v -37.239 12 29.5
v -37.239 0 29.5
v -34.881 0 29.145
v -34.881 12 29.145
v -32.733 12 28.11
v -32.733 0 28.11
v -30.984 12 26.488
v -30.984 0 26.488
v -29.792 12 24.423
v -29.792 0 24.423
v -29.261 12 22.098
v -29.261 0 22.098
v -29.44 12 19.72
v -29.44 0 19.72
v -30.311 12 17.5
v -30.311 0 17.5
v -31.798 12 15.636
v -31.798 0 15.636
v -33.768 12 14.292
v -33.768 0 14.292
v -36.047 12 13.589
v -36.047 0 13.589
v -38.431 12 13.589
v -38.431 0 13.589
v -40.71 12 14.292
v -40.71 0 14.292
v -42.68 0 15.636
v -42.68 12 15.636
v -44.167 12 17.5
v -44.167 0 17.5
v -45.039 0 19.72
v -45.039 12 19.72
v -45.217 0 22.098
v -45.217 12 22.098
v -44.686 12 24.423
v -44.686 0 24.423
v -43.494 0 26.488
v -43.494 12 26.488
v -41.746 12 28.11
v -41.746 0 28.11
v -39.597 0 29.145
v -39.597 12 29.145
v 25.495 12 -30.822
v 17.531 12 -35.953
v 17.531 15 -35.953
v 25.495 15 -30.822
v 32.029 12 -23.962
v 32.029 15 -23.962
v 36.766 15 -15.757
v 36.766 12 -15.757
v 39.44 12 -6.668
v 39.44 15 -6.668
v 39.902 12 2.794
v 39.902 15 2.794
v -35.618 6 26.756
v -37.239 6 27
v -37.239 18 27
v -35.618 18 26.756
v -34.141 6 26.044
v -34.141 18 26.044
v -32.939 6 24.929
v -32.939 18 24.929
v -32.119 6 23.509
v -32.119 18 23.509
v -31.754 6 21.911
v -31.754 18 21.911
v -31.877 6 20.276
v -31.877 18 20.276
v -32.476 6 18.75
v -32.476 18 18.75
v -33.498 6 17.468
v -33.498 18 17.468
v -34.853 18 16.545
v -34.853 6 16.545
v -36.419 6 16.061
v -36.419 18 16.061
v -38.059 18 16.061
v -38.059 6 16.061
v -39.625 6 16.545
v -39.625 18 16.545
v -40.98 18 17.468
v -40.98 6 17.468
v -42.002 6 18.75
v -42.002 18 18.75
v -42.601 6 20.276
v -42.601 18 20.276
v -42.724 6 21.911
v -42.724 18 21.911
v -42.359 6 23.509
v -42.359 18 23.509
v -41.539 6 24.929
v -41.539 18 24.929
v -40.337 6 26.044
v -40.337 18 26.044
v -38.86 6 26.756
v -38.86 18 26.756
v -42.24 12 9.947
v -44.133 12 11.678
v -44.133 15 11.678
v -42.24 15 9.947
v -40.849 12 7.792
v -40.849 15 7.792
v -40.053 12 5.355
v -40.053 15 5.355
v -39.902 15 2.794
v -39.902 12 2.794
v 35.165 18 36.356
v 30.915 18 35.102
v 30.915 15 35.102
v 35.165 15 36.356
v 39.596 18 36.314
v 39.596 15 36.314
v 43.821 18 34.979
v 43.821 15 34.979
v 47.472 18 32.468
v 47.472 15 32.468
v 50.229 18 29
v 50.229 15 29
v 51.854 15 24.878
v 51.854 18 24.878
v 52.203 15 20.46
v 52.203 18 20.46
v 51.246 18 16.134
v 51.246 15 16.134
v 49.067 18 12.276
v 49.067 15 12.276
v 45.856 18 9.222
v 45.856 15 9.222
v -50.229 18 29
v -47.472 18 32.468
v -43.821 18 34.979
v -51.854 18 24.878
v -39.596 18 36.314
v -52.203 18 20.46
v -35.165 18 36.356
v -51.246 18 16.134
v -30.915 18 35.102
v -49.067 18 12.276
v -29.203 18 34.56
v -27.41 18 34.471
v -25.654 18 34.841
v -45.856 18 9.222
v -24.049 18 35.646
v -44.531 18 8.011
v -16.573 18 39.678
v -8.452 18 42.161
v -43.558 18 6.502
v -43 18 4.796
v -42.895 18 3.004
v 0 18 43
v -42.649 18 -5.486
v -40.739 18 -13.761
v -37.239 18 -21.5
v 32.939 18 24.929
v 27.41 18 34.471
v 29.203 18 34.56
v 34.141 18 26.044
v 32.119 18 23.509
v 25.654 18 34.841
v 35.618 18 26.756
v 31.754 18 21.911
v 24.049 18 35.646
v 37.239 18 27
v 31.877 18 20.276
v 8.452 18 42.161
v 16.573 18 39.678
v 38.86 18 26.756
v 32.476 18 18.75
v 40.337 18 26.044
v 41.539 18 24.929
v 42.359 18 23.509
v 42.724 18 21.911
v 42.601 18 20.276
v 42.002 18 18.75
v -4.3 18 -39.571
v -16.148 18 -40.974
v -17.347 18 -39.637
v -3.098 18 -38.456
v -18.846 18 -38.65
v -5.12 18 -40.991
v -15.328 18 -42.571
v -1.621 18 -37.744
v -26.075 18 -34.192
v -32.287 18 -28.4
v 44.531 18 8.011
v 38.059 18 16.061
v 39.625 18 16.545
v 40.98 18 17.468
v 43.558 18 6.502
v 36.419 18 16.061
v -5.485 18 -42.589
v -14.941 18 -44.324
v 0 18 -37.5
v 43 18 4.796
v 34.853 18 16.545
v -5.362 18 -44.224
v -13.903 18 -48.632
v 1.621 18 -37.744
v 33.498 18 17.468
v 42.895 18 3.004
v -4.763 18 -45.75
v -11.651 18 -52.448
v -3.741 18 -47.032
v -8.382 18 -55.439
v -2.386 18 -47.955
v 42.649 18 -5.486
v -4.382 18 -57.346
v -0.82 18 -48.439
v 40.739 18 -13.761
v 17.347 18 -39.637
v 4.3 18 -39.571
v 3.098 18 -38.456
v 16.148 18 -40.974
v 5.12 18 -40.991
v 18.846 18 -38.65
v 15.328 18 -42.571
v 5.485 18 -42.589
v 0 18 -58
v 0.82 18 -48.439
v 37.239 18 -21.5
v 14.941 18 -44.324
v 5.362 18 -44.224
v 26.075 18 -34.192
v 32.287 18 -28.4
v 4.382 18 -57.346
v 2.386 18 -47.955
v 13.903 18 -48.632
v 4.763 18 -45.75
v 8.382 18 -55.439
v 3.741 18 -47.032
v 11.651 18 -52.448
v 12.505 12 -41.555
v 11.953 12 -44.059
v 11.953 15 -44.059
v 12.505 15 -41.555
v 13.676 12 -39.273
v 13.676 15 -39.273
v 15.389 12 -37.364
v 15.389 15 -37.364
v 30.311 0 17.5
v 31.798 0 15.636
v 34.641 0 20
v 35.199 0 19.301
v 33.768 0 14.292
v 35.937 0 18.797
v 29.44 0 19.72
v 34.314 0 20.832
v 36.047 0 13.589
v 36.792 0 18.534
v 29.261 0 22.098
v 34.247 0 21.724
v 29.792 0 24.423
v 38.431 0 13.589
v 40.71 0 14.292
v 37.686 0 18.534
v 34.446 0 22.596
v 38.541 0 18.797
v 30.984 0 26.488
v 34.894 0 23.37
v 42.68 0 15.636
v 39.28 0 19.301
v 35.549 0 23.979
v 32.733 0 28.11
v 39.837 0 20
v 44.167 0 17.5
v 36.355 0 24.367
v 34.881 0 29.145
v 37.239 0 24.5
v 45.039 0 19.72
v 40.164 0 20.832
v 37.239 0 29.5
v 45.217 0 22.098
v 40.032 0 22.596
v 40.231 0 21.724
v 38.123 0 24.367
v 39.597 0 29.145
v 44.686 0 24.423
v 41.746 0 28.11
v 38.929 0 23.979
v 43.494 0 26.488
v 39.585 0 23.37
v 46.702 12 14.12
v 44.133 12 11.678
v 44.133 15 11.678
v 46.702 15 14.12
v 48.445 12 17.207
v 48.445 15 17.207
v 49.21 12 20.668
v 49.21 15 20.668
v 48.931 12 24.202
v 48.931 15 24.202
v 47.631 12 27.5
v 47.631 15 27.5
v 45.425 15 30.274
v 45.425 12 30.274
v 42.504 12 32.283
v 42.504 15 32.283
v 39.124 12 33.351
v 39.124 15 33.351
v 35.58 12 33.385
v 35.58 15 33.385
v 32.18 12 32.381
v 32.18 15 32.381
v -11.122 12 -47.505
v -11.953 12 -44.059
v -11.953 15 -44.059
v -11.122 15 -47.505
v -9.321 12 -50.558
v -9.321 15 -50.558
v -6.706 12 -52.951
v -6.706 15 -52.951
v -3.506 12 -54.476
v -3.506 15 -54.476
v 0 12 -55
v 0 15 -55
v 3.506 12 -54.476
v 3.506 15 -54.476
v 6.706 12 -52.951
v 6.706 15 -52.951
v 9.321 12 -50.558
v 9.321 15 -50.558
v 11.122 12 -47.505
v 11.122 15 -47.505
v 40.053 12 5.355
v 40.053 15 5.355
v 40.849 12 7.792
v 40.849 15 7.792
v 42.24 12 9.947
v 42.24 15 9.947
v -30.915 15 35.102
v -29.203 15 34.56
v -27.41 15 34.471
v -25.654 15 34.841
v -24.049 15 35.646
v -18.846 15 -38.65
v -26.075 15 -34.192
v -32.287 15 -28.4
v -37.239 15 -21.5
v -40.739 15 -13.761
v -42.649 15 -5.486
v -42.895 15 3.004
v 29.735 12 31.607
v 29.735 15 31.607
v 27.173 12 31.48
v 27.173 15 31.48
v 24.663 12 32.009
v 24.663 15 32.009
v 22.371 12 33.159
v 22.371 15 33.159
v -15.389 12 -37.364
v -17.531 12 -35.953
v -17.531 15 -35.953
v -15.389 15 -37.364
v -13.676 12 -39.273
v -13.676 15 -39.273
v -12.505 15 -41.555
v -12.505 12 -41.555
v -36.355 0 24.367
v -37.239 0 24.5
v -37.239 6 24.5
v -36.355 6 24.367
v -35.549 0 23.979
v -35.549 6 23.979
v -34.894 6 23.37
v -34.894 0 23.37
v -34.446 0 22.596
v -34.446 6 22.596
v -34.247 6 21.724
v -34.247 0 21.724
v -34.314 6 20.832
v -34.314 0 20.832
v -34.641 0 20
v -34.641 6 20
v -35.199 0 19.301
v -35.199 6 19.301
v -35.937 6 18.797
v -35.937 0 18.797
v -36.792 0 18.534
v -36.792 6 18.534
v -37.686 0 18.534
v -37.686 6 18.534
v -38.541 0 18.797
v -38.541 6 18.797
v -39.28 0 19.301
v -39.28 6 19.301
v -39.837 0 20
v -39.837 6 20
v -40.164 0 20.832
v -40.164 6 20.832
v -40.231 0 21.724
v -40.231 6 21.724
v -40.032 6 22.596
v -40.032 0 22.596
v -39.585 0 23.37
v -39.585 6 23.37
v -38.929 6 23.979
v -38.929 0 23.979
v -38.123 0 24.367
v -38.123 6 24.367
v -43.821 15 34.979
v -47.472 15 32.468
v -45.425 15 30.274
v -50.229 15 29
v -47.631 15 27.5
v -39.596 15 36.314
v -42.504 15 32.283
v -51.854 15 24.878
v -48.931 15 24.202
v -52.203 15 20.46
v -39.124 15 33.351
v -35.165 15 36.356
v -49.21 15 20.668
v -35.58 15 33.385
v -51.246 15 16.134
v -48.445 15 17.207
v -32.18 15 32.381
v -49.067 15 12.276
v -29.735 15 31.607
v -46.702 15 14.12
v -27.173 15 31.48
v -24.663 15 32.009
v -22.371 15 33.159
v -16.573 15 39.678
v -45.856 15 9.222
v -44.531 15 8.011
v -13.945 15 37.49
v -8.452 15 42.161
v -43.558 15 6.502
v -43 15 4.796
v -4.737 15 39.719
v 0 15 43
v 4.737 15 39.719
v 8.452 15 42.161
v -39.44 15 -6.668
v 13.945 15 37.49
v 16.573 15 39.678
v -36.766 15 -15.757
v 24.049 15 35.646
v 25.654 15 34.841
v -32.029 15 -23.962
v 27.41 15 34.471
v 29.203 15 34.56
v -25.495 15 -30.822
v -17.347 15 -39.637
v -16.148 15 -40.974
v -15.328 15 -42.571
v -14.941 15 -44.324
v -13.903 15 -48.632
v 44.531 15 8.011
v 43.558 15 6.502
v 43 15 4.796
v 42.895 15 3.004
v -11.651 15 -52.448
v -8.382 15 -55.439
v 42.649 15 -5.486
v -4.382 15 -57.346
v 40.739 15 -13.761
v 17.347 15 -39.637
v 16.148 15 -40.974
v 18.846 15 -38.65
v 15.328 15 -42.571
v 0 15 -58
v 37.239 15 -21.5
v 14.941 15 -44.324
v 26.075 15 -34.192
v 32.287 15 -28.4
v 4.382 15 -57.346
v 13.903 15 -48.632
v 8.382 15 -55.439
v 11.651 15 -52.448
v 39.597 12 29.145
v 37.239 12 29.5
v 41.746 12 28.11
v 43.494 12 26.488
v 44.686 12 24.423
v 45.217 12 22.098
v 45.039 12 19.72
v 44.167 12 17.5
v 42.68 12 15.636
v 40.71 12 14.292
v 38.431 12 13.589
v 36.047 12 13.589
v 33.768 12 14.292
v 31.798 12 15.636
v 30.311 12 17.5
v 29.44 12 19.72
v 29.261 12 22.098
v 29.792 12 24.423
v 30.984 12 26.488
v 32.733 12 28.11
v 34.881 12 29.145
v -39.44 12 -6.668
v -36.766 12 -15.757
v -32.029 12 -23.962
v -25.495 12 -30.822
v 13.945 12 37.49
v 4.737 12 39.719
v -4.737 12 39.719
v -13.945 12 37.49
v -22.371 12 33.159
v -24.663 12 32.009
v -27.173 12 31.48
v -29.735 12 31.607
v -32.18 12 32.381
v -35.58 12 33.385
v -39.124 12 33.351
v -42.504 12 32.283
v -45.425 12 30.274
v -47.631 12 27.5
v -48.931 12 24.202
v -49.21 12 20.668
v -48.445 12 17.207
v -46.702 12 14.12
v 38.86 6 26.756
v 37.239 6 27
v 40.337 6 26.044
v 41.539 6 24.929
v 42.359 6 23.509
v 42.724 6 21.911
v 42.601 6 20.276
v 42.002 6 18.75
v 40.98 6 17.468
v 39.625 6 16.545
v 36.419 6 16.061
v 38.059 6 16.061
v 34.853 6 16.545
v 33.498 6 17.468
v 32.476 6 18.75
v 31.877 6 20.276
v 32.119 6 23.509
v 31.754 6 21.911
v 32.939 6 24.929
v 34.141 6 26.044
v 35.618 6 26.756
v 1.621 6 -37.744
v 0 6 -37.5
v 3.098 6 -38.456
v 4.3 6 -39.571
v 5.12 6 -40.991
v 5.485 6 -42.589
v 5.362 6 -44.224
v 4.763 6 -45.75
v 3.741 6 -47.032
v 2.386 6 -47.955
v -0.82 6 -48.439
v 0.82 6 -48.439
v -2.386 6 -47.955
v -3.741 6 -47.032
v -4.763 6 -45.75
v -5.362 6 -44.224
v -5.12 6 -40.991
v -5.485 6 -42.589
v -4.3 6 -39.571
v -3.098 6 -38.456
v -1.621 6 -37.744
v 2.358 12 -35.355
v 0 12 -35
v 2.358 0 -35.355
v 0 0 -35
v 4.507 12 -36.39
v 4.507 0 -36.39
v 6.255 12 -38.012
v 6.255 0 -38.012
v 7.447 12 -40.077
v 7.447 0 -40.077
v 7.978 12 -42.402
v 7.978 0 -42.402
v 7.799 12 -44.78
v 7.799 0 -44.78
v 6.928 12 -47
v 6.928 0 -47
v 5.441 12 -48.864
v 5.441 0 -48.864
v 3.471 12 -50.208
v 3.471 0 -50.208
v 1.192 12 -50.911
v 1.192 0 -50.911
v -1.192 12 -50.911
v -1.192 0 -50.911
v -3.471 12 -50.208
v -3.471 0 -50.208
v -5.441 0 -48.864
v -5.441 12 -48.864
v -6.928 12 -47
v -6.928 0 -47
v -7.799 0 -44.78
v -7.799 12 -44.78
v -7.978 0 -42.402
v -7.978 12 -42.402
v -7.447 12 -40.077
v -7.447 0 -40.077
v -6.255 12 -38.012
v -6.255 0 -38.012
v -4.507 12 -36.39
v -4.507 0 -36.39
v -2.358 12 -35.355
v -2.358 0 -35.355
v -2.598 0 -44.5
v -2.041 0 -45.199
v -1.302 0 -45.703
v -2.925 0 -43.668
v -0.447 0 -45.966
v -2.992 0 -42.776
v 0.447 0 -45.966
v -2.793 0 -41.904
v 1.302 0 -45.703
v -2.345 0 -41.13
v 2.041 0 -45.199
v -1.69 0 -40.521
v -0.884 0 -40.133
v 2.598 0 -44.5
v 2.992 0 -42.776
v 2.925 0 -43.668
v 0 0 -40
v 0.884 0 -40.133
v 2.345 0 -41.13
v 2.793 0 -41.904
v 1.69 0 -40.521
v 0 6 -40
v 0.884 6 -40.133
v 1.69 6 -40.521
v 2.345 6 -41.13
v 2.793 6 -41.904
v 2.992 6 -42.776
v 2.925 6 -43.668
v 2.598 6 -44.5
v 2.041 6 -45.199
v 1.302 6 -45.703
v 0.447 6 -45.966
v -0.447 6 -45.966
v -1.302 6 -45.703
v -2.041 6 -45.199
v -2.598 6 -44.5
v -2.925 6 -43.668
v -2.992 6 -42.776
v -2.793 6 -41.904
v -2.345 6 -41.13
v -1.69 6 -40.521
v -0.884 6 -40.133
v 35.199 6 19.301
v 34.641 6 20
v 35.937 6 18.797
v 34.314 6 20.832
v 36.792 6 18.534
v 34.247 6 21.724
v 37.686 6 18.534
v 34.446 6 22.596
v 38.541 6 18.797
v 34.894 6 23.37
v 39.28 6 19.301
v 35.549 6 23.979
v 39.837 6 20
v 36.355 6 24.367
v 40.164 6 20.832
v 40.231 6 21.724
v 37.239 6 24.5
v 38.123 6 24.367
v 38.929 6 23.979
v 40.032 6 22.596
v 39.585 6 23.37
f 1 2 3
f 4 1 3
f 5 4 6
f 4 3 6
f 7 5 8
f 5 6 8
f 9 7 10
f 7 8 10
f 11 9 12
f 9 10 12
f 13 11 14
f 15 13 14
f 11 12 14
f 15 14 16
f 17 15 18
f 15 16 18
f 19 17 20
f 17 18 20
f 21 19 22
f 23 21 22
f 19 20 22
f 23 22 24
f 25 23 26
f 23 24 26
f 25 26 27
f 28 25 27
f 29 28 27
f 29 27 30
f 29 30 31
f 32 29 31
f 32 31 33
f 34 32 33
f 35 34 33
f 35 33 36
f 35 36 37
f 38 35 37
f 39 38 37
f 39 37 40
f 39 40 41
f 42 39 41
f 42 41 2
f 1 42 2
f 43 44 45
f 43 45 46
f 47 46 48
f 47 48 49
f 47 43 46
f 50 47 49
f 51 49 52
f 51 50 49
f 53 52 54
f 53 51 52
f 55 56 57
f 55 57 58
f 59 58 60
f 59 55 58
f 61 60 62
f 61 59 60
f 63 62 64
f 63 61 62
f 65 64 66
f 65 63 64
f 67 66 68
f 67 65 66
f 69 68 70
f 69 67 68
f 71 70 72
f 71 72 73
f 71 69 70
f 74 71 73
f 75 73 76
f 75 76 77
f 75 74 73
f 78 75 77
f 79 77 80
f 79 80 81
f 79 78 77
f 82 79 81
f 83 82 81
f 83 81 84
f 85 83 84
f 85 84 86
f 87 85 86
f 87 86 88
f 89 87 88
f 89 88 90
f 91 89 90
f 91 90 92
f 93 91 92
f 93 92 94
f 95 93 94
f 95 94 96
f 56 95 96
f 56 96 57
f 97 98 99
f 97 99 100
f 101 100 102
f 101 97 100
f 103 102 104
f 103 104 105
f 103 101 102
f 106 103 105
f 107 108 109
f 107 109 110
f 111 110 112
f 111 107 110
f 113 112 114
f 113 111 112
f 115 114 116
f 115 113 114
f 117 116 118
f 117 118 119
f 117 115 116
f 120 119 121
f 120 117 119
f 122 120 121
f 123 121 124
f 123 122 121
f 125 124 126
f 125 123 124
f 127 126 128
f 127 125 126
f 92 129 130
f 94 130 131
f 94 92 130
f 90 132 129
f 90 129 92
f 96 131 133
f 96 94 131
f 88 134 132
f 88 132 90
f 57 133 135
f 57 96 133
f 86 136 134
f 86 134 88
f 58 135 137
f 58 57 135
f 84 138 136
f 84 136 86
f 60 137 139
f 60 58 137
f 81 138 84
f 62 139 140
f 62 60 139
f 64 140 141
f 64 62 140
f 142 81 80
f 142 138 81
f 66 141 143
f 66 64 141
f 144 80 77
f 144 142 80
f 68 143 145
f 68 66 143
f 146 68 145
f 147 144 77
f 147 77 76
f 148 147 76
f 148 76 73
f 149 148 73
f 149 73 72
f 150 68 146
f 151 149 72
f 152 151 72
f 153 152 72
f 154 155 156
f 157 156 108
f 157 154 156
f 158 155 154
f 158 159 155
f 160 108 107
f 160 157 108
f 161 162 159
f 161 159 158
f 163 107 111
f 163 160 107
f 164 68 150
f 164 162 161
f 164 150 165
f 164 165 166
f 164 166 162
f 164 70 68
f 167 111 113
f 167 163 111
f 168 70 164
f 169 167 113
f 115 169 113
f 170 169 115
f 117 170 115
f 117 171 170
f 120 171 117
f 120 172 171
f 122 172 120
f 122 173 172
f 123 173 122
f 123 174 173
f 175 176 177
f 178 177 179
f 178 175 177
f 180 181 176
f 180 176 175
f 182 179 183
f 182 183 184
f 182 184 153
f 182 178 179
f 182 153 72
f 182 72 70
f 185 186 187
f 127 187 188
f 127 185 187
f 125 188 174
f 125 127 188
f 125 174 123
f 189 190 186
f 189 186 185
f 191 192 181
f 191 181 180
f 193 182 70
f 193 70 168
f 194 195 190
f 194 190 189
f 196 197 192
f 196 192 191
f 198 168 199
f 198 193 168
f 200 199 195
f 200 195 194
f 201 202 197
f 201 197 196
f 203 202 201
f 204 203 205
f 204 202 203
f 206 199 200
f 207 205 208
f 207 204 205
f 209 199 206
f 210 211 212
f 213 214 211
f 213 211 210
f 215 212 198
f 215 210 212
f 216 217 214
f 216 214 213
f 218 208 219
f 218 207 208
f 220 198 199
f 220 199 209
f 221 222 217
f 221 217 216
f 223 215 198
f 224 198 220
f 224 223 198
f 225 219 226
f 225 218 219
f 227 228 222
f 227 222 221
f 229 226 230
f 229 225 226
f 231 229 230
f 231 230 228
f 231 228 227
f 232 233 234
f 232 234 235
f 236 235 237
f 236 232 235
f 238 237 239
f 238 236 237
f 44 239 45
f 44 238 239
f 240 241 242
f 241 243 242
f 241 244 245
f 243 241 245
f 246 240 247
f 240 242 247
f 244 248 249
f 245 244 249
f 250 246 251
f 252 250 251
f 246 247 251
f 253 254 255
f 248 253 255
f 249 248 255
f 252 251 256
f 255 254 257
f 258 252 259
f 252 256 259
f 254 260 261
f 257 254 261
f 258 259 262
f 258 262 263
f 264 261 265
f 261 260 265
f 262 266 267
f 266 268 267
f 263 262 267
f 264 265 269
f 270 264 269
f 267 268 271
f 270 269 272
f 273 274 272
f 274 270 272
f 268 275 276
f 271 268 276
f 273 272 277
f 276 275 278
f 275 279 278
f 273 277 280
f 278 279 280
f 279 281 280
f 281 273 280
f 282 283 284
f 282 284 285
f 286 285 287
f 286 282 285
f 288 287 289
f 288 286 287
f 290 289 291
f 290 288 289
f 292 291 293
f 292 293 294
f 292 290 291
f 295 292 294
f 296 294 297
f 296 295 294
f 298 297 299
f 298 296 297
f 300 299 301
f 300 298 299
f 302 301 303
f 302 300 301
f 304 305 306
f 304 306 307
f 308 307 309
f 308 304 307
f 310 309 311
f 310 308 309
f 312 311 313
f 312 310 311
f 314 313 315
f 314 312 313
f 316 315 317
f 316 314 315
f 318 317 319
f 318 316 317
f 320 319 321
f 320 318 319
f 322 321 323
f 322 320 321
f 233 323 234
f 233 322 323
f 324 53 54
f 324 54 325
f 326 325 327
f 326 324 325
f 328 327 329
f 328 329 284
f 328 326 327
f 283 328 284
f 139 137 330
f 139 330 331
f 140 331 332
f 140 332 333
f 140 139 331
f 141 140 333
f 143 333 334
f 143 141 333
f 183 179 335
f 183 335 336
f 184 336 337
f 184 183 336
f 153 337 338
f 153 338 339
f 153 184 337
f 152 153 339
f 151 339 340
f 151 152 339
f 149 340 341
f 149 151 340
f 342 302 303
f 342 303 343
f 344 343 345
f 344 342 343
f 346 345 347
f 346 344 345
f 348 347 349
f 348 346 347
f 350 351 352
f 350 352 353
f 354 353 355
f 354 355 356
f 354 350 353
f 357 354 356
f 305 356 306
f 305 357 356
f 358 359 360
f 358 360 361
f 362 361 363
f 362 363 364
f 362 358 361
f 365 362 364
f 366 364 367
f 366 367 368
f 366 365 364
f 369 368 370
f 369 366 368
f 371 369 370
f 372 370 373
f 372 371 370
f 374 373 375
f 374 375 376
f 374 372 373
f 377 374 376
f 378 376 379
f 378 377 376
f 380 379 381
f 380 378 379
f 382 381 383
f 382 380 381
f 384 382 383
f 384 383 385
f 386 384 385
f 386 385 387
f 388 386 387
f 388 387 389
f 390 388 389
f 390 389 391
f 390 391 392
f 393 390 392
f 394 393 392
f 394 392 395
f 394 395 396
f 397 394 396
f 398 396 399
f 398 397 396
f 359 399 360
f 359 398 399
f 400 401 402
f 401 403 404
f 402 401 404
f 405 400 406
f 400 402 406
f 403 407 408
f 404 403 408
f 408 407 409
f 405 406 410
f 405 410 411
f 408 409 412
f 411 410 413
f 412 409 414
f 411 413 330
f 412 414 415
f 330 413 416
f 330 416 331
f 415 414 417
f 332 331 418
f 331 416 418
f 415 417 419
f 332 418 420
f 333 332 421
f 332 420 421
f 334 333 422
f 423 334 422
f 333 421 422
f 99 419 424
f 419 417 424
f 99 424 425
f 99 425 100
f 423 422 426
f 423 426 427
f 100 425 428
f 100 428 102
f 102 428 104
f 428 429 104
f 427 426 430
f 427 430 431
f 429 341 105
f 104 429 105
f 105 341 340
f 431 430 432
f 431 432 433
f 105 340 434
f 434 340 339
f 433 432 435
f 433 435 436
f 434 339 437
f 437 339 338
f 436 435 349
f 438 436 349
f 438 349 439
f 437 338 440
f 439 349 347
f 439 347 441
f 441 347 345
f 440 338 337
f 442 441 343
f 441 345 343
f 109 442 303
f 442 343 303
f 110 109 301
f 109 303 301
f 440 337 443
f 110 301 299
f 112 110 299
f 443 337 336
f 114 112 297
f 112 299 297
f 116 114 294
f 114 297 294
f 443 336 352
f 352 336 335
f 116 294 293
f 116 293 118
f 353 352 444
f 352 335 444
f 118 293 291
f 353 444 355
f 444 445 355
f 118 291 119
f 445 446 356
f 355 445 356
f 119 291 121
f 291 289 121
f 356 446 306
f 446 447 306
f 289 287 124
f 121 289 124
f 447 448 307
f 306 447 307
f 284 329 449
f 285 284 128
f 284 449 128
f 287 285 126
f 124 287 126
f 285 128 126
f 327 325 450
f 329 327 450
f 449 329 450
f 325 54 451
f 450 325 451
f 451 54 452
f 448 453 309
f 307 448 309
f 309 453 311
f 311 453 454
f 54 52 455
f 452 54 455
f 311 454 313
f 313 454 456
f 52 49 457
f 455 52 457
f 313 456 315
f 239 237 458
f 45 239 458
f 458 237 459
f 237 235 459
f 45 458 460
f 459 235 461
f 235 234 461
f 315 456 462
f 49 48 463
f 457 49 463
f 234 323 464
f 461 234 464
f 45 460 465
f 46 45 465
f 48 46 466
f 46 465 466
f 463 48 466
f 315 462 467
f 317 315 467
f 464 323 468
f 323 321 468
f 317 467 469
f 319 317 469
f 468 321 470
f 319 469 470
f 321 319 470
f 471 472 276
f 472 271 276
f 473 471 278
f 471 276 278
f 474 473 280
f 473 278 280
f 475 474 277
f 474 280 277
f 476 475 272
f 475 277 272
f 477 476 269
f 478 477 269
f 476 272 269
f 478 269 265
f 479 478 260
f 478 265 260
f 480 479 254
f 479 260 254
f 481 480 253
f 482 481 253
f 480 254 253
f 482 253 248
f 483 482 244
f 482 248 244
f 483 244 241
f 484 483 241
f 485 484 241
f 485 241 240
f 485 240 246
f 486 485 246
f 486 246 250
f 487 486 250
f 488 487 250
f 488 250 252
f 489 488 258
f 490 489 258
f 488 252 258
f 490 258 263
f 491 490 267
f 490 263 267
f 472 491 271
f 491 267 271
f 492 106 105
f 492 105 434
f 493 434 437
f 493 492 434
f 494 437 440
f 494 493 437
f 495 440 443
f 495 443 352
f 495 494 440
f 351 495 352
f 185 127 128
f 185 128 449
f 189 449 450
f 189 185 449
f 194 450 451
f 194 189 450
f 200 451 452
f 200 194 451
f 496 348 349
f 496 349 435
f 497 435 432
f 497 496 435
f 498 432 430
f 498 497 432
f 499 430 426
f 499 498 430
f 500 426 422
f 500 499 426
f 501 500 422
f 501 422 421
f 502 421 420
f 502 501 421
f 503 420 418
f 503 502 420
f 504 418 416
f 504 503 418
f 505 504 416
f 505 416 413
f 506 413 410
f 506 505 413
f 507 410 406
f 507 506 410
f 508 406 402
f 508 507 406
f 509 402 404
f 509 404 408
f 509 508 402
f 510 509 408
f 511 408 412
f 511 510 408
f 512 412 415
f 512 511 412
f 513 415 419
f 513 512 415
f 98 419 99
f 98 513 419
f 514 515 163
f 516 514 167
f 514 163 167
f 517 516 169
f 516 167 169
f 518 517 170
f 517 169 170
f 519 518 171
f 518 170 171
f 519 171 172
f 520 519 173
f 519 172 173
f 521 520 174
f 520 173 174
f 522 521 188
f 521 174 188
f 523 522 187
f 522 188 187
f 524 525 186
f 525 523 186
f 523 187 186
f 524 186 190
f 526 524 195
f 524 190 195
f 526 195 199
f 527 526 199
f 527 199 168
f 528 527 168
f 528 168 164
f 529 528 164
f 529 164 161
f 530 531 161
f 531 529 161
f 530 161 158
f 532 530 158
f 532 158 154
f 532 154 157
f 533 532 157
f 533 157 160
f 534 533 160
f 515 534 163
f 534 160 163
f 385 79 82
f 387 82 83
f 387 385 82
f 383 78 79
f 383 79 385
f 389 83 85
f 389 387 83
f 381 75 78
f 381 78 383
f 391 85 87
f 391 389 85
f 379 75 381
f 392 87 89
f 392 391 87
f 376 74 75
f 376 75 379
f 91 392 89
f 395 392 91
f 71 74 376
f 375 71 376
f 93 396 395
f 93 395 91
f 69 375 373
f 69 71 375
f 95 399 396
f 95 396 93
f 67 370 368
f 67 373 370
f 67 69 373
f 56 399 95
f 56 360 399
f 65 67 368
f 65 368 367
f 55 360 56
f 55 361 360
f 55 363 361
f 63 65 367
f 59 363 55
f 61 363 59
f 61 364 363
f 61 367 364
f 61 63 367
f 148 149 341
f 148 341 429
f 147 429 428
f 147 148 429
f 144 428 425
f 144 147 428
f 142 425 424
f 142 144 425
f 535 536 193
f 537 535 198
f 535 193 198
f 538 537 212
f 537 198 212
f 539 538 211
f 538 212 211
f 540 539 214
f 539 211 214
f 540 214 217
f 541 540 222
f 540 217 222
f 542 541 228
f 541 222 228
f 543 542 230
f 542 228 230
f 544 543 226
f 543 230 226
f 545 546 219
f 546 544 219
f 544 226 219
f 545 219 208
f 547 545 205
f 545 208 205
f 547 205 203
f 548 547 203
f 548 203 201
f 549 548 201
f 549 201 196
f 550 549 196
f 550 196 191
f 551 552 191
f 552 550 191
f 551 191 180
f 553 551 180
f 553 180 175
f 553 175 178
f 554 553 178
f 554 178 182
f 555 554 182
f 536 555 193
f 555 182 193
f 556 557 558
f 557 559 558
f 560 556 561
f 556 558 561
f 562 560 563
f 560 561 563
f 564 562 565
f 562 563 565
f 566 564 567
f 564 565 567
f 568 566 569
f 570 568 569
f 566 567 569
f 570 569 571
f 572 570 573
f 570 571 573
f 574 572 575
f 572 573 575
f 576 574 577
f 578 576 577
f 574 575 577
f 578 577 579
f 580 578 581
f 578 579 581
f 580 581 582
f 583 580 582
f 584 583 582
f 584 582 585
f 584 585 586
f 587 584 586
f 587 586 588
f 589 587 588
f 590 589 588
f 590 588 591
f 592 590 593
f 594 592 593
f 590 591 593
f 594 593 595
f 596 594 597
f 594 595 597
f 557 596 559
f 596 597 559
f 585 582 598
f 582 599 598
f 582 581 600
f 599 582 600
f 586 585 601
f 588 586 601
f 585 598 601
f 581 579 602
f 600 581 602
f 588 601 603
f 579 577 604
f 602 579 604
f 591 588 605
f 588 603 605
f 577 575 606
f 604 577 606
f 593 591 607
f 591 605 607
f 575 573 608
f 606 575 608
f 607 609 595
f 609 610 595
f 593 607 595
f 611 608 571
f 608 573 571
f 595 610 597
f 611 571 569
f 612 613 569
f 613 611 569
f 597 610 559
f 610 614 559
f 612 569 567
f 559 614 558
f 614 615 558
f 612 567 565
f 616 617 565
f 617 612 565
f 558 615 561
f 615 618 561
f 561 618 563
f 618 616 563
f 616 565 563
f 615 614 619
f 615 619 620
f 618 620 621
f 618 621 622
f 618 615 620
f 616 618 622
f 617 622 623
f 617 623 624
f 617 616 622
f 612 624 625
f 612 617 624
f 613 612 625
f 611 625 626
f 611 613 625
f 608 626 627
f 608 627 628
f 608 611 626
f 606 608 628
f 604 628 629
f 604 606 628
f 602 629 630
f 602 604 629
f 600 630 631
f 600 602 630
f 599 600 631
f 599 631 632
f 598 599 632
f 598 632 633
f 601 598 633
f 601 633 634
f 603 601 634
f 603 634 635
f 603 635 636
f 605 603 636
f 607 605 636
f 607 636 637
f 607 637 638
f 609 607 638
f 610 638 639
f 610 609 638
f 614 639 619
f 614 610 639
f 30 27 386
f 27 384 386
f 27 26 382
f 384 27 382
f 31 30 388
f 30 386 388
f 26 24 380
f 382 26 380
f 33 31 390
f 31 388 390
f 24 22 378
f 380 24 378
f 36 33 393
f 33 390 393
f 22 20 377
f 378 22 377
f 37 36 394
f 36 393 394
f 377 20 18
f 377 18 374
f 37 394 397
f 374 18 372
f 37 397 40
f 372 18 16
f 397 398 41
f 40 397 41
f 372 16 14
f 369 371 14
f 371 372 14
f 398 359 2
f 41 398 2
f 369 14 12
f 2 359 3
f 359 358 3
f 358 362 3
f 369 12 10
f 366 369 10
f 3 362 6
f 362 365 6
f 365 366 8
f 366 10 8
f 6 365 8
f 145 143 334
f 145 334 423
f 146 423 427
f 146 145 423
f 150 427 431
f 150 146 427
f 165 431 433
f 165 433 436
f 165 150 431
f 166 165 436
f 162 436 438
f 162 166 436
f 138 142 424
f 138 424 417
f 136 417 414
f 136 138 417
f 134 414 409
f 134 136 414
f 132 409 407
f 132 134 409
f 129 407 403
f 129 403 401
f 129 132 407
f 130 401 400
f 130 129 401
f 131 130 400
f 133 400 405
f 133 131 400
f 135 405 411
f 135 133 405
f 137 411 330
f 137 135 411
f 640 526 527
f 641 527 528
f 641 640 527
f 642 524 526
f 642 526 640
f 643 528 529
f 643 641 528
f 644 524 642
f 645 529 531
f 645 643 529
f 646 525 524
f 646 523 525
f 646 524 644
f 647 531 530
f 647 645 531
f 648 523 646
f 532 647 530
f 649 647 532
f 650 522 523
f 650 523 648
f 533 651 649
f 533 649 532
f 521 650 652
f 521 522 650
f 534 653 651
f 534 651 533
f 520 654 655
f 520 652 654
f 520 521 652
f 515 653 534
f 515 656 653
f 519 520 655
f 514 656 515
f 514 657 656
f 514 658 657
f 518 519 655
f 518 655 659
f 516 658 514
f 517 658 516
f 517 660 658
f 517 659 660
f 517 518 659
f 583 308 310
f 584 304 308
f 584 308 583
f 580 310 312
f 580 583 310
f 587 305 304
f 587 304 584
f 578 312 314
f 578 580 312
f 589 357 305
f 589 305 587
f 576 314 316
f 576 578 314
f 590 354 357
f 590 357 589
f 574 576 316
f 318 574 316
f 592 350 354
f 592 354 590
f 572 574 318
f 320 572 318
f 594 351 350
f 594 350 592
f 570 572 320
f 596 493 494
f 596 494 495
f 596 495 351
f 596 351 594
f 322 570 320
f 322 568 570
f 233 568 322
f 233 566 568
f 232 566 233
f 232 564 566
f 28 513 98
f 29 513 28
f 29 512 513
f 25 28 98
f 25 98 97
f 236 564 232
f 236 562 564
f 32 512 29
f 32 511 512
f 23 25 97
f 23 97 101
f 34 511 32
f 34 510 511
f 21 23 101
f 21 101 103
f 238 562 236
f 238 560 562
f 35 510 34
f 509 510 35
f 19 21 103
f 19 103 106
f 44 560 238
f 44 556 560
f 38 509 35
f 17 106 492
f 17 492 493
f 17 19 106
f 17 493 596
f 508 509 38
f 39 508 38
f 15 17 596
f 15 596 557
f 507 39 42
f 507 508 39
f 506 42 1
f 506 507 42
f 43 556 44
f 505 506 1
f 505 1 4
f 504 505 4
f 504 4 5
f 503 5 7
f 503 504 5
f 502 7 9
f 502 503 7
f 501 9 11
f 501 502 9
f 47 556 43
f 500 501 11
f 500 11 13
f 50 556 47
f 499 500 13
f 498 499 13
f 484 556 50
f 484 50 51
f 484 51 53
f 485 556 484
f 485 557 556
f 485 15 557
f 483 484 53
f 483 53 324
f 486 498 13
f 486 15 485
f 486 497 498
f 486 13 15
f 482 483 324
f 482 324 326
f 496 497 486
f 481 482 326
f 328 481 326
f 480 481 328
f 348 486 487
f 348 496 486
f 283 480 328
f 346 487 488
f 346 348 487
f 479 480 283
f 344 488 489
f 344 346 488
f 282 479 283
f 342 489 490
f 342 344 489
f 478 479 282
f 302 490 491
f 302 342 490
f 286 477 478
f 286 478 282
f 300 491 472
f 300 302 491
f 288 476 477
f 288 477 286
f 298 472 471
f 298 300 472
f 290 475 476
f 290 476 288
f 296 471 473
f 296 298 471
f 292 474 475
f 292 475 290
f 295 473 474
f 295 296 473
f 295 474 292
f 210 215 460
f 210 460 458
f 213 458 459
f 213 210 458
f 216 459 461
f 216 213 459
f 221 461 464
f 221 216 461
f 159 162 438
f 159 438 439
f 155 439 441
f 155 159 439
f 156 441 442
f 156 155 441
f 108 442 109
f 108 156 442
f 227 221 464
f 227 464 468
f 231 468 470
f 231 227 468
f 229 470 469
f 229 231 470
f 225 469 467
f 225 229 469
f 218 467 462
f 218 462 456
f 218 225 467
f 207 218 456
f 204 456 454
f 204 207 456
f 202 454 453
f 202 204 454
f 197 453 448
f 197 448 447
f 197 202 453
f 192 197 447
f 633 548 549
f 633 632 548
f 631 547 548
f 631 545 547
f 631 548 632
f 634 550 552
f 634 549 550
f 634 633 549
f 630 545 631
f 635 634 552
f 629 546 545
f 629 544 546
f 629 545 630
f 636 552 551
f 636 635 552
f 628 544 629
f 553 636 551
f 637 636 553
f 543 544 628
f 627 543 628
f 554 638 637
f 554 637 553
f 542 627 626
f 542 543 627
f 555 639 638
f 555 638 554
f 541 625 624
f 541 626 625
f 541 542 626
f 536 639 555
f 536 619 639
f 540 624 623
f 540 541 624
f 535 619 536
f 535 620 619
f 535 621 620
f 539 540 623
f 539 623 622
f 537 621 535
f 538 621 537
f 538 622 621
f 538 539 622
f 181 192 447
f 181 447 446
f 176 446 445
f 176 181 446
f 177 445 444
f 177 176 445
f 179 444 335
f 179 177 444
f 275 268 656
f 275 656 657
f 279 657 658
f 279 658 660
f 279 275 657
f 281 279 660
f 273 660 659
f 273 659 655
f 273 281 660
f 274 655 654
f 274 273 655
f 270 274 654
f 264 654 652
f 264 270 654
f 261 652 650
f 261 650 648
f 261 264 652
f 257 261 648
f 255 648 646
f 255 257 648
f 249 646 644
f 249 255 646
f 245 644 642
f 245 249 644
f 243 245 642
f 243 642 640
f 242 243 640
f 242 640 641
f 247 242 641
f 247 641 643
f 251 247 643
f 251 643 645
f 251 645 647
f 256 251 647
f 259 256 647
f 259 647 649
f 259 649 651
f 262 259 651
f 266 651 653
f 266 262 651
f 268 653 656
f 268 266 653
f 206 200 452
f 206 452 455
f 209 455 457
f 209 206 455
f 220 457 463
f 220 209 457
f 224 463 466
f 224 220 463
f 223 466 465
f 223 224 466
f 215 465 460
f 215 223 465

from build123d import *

# Parameters (mm, degrees)
SKETCH1_R             = 8
SKETCH1_R_2           = 3
BOSS_EXTRUDE1_DEPTH   = 6
BOSS_EXTRUDE1_2_DEPTH = 6
BOSS_EXTRUDE1_3_DEPTH = 6
BOSS_EXTRUDE3_START   = 18
SKETCH1_4_R           = 5.5
BOSS_EXTRUDE3_DEPTH   = 3
SKETCH1_3_R           = 8
SKETCH1_3_R_2         = 5.5
BOSS_EXTRUDE2_DEPTH   = 18
BOSS_EXTRUDE4_START   = 3
SKETCH2_R             = 8
BOSS_EXTRUDE4_DEPTH   = 3


with BuildPart() as part:
    # Sketch1 → Boss-Extrude1 (new body)
    with BuildSketch(Plane(origin=(0, 0, 0), x_dir=(1, 0, 0), z_dir=(0, 1, 0))):
        with Locations(Location((0, 43, 0), (0, 0, 270))):
            Circle(SKETCH1_R)
        with Locations(Location((0, 43, 0), (0, 0, 270))):
            Circle(SKETCH1_R_2, mode=Mode.SUBTRACT)
    extrude(amount=BOSS_EXTRUDE1_DEPTH)



with BuildPart() as body_2:
    # Sketch1 → Boss-Extrude1 2 (new body)
    with BuildSketch(Plane(origin=(0, 0, 0), x_dir=(1, 0, 0), z_dir=(0, 1, 0))):
        with Locations(Location((37.239092363, -21.5, 0), (0, 0, 270))):
            Circle(SKETCH1_R)
        with Locations(Location((37.239092363, -21.5, 0), (0, 0, 270))):
            Circle(SKETCH1_R_2, mode=Mode.SUBTRACT)
    extrude(amount=BOSS_EXTRUDE1_2_DEPTH)


with BuildPart() as body_3:
    # Sketch1 → Boss-Extrude1 3 (new body)
    with BuildSketch(Plane(origin=(0, 0, 0), x_dir=(1, 0, 0), z_dir=(0, 1, 0))):
        with Locations(Location((-37.239092363, -21.5, 0), (0, 0, 270))):
            Circle(SKETCH1_R)
        with Locations(Location((-37.239092363, -21.5, 0), (0, 0, 270))):
            Circle(SKETCH1_R_2, mode=Mode.SUBTRACT)
    extrude(amount=BOSS_EXTRUDE1_3_DEPTH)


with BuildPart() as body_4:
    # Sketch1<4> → Boss-Extrude3 (new body)
    with BuildSketch(Plane(origin=(0, 0, 0), x_dir=(1, 0, 0), z_dir=(0, 1, 0)).offset(BOSS_EXTRUDE3_START)):
        with BuildLine():
            ThreePointArc((14.941453584, 44.323995772), (0, 58), (-14.941453584, 44.323995772))
            ThreePointArc((-14.941453584, 44.323995772), (-16.147655157, 40.973517523), (-18.846153454, 38.65))
            ThreePointArc((-18.846153454, 38.65), (-37.239092363, 21.5), (-42.894958583, -3.003752345))
            ThreePointArc((-42.894958583, -3.003752345), (-43.557934635, -6.502479184), (-45.856433127, -9.222319513))
            ThreePointArc((-45.856433127, -9.222319513), (-50.229473419, -29), (-30.914979544, -35.101676259))
            ThreePointArc((-30.914979544, -35.101676259), (-27.410279478, -34.471038339), (-24.048805129, -35.646247655))
            ThreePointArc((-24.048805129, -35.646247655), (0, -43), (24.048805129, -35.646247655))
            ThreePointArc((24.048805129, -35.646247655), (27.410279478, -34.471038339), (30.914979544, -35.101676259))
            ThreePointArc((30.914979544, -35.101676259), (50.229473419, -29), (45.856433127, -9.222319513))
            ThreePointArc((45.856433127, -9.222319513), (43.557934635, -6.502479184), (42.894958583, -3.003752345))
            ThreePointArc((42.894958583, -3.003752345), (37.239092363, 21.5), (18.846153454, 38.65))
            ThreePointArc((18.846153454, 38.65), (16.147655157, 40.973517523), (14.941453584, 44.323995772))
        make_face()
        with Locations(Location((0, 43, 0), (0, 0, 270))):
            Circle(SKETCH1_4_R, mode=Mode.SUBTRACT)
        with Locations(Location((37.239092363, -21.5, 0), (0, 0, 270))):
            Circle(SKETCH1_4_R, mode=Mode.SUBTRACT)
        with Locations(Location((-37.239092363, -21.5, 0), (0, 0, 270))):
            Circle(SKETCH1_4_R, mode=Mode.SUBTRACT)
    extrude(amount=-BOSS_EXTRUDE3_DEPTH)


with BuildPart() as part_1:
    add(part.part)

    add(body_2.part)  # Boss-Extrude2 merges body 2

    add(body_3.part)  # Boss-Extrude2 merges body 3

    add(body_4.part)  # Boss-Extrude2 merges body 4
    # Sketch1<3> → Boss-Extrude2 (add)
    # profile 1 of 3: a face of its own
    with BuildSketch(Plane(origin=(0, 0, 0), x_dir=(1, 0, 0), z_dir=(0, 1, 0))):
        with Locations(Location((-37.239092363, -21.5, 0), (0, 0, 270))):
            Circle(SKETCH1_3_R)
        with Locations(Location((-37.239092363, -21.5, 0), (0, 0, 270))):
            Circle(SKETCH1_3_R_2, mode=Mode.SUBTRACT)
    # profile 2 of 3: a face of its own
    with BuildSketch(Plane(origin=(0, 0, 0), x_dir=(1, 0, 0), z_dir=(0, 1, 0))):
        with Locations(Location((37.239092363, -21.5, 0), (0, 0, 270))):
            Circle(SKETCH1_3_R)
        with Locations(Location((37.239092363, -21.5, 0), (0, 0, 270))):
            Circle(SKETCH1_3_R_2, mode=Mode.SUBTRACT)
    # profile 3 of 3: a face of its own
    with BuildSketch(Plane(origin=(0, 0, 0), x_dir=(1, 0, 0), z_dir=(0, 1, 0))):
        with Locations(Location((0, 43, 0), (0, 0, 270))):
            Circle(SKETCH1_3_R)
        with Locations(Location((0, 43, 0), (0, 0, 270))):
            Circle(SKETCH1_3_R_2, mode=Mode.SUBTRACT)
    extrude(amount=BOSS_EXTRUDE2_DEPTH)

    # Sketch2 → Boss-Extrude4 (add)
    with BuildSketch(Plane.XZ.offset(-15).offset(BOSS_EXTRUDE4_START)):
        with BuildLine():
            ThreePointArc((-39.902287054, 2.794188228), (-34.641016151, -20), (-17.531305538, -35.953488372))
            ThreePointArc((-17.531305538, -35.953488372), (-13.676307972, -39.272799119), (-11.953162867, -44.059196617))
            ThreePointArc((-11.953162867, -44.059196617), (0, -55), (11.953162867, -44.059196617))
            ThreePointArc((11.953162867, -44.059196617), (13.676307972, -39.272799119), (17.531305538, -35.953488372))
            ThreePointArc((17.531305538, -35.953488372), (34.641016151, -20), (39.902287054, 2.794188228))
            ThreePointArc((39.902287054, 2.794188228), (40.8493957, 7.792369426), (44.132964974, 11.67785561))
            ThreePointArc((44.132964974, 11.67785561), (47.631397208, 27.5), (32.179802107, 32.381341007))
            ThreePointArc((32.179802107, 32.381341007), (27.173087728, 31.480429693), (22.370981516, 33.159300144))
            ThreePointArc((22.370981516, 33.159300144), (0, 40), (-22.370981516, 33.159300144))
            ThreePointArc((-22.370981516, 33.159300144), (-27.173087728, 31.480429693), (-32.179802107, 32.381341007))
            ThreePointArc((-32.179802107, 32.381341007), (-47.631397208, 27.5), (-44.132964974, 11.67785561))
            ThreePointArc((-44.132964974, 11.67785561), (-40.8493957, 7.792369426), (-39.902287054, 2.794188228))
        make_face()
        with Locations(Location((0, -43, 0), (0, 0, 270))):
            Circle(SKETCH2_R, mode=Mode.SUBTRACT)
        with Locations(Location((37.239092363, 21.5, 0), (0, 0, 270))):
            Circle(SKETCH2_R, mode=Mode.SUBTRACT)
        with Locations(Location((-37.239092363, 21.5, 0), (0, 0, 270))):
            Circle(SKETCH2_R, mode=Mode.SUBTRACT)
    extrude(amount=-BOSS_EXTRUDE4_DEPTH)


solid = part_1.part
